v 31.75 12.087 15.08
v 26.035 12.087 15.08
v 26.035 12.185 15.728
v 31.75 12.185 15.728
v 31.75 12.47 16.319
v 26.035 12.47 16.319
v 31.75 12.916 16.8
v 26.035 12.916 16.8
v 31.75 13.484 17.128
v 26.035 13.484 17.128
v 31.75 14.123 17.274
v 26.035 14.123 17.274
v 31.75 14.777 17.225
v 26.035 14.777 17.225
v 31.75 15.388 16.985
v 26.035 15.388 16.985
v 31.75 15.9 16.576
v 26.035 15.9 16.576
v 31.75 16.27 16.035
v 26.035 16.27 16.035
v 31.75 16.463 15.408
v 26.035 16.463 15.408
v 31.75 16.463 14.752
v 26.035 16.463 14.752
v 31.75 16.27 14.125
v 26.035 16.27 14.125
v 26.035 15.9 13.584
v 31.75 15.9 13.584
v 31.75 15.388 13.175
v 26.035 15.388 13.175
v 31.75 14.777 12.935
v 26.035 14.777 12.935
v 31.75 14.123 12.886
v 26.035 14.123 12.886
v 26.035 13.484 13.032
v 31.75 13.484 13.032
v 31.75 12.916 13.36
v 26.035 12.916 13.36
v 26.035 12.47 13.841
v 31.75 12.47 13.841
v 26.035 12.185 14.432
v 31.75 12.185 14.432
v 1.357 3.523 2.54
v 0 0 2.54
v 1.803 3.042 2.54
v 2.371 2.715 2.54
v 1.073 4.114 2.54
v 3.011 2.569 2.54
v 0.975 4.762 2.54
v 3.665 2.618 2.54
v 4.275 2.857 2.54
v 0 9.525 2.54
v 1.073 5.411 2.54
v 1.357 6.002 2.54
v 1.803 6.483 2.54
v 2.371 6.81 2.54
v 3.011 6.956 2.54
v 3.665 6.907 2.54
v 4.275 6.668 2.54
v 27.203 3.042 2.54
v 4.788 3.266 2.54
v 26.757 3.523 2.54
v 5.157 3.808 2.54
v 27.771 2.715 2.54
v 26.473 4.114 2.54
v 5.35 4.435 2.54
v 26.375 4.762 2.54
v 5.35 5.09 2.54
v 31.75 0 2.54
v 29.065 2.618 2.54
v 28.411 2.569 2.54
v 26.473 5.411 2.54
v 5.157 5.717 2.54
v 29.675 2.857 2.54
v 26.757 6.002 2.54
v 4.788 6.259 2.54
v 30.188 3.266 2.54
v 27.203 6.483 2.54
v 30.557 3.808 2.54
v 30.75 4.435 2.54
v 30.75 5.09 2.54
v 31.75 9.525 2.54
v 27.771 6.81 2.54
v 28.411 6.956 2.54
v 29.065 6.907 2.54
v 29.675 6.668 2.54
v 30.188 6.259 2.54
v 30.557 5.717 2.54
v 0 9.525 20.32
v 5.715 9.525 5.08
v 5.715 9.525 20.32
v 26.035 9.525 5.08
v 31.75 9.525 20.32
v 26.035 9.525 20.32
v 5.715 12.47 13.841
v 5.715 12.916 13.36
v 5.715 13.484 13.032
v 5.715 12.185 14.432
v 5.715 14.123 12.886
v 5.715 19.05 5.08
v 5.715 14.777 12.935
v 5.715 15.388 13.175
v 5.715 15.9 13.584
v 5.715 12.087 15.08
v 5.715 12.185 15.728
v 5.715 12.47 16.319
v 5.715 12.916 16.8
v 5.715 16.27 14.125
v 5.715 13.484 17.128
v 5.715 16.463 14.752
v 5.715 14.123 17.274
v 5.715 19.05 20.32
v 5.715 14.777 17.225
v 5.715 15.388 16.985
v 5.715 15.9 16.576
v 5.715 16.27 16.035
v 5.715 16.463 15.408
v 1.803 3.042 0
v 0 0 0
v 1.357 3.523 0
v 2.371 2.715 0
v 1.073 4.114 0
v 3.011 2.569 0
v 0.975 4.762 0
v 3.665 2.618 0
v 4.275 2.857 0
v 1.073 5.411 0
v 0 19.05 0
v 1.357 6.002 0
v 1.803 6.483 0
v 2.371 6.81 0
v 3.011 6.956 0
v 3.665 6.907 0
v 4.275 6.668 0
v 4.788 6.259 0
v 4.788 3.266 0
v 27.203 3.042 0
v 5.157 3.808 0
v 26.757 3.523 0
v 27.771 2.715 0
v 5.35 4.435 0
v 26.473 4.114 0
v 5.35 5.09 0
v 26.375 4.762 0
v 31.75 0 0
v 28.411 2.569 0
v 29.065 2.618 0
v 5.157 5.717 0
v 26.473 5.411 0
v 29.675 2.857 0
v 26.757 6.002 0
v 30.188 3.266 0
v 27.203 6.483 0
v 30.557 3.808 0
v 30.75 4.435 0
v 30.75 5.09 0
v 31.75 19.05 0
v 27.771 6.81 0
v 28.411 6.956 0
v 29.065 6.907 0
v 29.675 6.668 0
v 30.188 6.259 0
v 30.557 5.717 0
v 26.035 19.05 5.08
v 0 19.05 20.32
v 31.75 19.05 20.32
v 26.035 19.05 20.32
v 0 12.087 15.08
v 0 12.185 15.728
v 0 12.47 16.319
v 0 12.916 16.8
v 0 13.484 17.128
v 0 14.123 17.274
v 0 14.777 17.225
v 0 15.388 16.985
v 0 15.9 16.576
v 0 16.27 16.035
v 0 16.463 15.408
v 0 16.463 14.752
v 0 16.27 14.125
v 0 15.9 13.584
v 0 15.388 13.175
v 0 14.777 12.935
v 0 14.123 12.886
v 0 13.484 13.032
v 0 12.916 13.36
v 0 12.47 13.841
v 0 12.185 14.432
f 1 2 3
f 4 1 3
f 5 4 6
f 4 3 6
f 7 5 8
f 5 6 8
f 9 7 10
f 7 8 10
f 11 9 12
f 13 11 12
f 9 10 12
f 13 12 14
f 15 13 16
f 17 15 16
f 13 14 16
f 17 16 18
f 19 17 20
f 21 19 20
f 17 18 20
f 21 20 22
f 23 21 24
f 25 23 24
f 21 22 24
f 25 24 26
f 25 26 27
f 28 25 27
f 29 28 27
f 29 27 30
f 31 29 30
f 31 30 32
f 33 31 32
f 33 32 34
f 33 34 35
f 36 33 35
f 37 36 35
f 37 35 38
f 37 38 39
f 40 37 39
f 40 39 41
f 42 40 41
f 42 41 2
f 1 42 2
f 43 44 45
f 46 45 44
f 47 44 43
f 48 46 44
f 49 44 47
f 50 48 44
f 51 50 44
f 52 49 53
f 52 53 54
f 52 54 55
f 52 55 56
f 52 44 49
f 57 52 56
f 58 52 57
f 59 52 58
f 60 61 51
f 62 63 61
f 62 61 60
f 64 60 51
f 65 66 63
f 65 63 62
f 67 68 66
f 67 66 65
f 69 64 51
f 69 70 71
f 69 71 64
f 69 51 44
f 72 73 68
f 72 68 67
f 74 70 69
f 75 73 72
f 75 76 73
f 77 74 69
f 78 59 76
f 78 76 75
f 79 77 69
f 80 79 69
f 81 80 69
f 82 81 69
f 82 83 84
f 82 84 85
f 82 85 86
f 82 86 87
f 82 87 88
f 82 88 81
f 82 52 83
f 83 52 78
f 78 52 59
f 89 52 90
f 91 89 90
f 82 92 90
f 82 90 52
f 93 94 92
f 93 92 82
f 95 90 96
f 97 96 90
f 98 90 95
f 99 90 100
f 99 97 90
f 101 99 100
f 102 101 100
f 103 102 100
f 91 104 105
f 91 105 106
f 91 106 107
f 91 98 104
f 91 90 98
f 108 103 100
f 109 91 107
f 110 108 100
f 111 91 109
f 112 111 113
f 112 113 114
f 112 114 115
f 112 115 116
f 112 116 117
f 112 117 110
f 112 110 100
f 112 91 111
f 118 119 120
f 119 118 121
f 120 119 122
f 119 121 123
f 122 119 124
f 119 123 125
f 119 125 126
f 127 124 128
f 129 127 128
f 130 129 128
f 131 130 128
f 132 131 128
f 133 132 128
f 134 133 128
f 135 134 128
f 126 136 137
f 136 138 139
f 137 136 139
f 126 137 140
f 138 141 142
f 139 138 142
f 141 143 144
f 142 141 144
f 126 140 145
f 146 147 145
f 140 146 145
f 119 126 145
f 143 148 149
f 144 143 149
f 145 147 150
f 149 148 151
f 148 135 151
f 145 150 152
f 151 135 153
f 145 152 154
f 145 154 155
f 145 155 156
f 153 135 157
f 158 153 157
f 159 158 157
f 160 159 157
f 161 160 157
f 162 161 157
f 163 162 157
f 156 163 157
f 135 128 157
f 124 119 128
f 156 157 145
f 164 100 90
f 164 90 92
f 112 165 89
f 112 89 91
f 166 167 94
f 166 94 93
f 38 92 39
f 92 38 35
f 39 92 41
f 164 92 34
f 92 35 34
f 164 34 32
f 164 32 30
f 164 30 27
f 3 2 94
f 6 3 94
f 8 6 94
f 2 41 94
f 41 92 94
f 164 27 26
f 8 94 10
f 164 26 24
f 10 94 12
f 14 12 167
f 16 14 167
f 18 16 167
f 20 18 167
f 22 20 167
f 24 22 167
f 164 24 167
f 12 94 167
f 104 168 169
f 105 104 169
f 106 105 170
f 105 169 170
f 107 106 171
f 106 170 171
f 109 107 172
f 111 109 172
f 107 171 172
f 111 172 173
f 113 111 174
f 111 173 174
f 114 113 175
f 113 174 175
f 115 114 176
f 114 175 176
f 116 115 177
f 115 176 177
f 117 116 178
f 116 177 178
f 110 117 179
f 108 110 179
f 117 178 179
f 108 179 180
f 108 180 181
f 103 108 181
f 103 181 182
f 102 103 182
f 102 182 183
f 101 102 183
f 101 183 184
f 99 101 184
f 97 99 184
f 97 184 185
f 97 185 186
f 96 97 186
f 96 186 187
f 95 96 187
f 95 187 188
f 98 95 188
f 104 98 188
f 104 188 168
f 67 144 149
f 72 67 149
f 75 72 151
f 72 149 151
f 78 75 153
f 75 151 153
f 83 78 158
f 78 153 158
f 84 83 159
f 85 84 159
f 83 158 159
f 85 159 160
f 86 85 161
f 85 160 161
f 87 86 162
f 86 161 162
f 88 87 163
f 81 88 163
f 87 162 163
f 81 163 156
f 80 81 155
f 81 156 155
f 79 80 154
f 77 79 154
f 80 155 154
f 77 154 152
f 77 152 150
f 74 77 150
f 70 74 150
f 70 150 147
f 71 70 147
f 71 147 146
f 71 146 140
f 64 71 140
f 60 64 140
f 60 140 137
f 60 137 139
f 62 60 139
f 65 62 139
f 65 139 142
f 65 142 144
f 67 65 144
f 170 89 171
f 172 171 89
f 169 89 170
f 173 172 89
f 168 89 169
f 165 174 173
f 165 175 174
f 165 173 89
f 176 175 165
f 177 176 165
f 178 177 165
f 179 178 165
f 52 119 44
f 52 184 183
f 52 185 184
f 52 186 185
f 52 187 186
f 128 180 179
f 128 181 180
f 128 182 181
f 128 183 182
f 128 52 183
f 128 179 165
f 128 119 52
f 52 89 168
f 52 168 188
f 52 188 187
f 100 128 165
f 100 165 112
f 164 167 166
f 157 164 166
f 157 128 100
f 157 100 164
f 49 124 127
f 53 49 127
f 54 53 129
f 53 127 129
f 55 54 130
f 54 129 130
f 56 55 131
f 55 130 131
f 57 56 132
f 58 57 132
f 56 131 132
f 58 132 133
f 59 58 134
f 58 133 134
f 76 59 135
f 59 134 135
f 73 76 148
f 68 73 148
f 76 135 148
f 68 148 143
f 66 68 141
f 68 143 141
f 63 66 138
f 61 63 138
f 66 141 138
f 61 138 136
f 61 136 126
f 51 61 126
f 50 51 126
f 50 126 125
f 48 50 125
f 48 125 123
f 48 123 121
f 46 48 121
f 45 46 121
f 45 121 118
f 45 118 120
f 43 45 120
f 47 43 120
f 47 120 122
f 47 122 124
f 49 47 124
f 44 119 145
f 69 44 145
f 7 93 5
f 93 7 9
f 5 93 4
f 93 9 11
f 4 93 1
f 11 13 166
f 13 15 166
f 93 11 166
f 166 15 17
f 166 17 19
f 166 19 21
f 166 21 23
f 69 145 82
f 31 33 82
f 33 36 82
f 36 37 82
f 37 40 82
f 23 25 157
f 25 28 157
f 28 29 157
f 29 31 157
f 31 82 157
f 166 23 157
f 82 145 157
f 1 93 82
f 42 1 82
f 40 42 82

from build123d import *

# Parameters (mm, degrees)
F0_W     = 31.75
F0_H     = 19.05
F1_DEPTH = 20.32
F2_W     = 31.75
F2_H     = 9.525
F3_DEPTH = 17.78
F4_W     = 20.32
F4_H     = 9.525
F5_DEPTH = 15.24
F7_D     = 4.4
F9_D     = 4.4


with BuildPart() as f1:
    # F0 (on Top) → F1 (new body)
    with BuildSketch(Plane.XY):
        with Locations((15.875, 9.525)):
            Rectangle(F0_W, F0_H)
    extrude(amount=F1_DEPTH)

    # F2 (on face) → F3 (cut)
    with BuildSketch(Plane.XY.offset(20.32)):
        with Locations((15.875, 4.7625)):
            Rectangle(F2_W, F2_H)
    extrude(amount=-F3_DEPTH, mode=Mode.SUBTRACT)

    # F4 (on face) → F5 (cut)
    with BuildSketch(Plane.XY.offset(20.32)):
        with Locations((15.875, 14.2875)):
            Rectangle(F4_W, F4_H)
    extrude(amount=-F5_DEPTH, mode=Mode.SUBTRACT)

    # F7 (through all)
    with Locations(Plane.XY.offset(2.54)):
        with Locations((3.175, 4.7625), (28.575, 4.7625)):
            Hole(F7_D / 2)

    # F9 (through all)
    with Locations(Plane.YZ.offset(31.75)):
        with Locations((14.2875, 15.08)):
            Hole(F9_D / 2)


solid = f1.part
